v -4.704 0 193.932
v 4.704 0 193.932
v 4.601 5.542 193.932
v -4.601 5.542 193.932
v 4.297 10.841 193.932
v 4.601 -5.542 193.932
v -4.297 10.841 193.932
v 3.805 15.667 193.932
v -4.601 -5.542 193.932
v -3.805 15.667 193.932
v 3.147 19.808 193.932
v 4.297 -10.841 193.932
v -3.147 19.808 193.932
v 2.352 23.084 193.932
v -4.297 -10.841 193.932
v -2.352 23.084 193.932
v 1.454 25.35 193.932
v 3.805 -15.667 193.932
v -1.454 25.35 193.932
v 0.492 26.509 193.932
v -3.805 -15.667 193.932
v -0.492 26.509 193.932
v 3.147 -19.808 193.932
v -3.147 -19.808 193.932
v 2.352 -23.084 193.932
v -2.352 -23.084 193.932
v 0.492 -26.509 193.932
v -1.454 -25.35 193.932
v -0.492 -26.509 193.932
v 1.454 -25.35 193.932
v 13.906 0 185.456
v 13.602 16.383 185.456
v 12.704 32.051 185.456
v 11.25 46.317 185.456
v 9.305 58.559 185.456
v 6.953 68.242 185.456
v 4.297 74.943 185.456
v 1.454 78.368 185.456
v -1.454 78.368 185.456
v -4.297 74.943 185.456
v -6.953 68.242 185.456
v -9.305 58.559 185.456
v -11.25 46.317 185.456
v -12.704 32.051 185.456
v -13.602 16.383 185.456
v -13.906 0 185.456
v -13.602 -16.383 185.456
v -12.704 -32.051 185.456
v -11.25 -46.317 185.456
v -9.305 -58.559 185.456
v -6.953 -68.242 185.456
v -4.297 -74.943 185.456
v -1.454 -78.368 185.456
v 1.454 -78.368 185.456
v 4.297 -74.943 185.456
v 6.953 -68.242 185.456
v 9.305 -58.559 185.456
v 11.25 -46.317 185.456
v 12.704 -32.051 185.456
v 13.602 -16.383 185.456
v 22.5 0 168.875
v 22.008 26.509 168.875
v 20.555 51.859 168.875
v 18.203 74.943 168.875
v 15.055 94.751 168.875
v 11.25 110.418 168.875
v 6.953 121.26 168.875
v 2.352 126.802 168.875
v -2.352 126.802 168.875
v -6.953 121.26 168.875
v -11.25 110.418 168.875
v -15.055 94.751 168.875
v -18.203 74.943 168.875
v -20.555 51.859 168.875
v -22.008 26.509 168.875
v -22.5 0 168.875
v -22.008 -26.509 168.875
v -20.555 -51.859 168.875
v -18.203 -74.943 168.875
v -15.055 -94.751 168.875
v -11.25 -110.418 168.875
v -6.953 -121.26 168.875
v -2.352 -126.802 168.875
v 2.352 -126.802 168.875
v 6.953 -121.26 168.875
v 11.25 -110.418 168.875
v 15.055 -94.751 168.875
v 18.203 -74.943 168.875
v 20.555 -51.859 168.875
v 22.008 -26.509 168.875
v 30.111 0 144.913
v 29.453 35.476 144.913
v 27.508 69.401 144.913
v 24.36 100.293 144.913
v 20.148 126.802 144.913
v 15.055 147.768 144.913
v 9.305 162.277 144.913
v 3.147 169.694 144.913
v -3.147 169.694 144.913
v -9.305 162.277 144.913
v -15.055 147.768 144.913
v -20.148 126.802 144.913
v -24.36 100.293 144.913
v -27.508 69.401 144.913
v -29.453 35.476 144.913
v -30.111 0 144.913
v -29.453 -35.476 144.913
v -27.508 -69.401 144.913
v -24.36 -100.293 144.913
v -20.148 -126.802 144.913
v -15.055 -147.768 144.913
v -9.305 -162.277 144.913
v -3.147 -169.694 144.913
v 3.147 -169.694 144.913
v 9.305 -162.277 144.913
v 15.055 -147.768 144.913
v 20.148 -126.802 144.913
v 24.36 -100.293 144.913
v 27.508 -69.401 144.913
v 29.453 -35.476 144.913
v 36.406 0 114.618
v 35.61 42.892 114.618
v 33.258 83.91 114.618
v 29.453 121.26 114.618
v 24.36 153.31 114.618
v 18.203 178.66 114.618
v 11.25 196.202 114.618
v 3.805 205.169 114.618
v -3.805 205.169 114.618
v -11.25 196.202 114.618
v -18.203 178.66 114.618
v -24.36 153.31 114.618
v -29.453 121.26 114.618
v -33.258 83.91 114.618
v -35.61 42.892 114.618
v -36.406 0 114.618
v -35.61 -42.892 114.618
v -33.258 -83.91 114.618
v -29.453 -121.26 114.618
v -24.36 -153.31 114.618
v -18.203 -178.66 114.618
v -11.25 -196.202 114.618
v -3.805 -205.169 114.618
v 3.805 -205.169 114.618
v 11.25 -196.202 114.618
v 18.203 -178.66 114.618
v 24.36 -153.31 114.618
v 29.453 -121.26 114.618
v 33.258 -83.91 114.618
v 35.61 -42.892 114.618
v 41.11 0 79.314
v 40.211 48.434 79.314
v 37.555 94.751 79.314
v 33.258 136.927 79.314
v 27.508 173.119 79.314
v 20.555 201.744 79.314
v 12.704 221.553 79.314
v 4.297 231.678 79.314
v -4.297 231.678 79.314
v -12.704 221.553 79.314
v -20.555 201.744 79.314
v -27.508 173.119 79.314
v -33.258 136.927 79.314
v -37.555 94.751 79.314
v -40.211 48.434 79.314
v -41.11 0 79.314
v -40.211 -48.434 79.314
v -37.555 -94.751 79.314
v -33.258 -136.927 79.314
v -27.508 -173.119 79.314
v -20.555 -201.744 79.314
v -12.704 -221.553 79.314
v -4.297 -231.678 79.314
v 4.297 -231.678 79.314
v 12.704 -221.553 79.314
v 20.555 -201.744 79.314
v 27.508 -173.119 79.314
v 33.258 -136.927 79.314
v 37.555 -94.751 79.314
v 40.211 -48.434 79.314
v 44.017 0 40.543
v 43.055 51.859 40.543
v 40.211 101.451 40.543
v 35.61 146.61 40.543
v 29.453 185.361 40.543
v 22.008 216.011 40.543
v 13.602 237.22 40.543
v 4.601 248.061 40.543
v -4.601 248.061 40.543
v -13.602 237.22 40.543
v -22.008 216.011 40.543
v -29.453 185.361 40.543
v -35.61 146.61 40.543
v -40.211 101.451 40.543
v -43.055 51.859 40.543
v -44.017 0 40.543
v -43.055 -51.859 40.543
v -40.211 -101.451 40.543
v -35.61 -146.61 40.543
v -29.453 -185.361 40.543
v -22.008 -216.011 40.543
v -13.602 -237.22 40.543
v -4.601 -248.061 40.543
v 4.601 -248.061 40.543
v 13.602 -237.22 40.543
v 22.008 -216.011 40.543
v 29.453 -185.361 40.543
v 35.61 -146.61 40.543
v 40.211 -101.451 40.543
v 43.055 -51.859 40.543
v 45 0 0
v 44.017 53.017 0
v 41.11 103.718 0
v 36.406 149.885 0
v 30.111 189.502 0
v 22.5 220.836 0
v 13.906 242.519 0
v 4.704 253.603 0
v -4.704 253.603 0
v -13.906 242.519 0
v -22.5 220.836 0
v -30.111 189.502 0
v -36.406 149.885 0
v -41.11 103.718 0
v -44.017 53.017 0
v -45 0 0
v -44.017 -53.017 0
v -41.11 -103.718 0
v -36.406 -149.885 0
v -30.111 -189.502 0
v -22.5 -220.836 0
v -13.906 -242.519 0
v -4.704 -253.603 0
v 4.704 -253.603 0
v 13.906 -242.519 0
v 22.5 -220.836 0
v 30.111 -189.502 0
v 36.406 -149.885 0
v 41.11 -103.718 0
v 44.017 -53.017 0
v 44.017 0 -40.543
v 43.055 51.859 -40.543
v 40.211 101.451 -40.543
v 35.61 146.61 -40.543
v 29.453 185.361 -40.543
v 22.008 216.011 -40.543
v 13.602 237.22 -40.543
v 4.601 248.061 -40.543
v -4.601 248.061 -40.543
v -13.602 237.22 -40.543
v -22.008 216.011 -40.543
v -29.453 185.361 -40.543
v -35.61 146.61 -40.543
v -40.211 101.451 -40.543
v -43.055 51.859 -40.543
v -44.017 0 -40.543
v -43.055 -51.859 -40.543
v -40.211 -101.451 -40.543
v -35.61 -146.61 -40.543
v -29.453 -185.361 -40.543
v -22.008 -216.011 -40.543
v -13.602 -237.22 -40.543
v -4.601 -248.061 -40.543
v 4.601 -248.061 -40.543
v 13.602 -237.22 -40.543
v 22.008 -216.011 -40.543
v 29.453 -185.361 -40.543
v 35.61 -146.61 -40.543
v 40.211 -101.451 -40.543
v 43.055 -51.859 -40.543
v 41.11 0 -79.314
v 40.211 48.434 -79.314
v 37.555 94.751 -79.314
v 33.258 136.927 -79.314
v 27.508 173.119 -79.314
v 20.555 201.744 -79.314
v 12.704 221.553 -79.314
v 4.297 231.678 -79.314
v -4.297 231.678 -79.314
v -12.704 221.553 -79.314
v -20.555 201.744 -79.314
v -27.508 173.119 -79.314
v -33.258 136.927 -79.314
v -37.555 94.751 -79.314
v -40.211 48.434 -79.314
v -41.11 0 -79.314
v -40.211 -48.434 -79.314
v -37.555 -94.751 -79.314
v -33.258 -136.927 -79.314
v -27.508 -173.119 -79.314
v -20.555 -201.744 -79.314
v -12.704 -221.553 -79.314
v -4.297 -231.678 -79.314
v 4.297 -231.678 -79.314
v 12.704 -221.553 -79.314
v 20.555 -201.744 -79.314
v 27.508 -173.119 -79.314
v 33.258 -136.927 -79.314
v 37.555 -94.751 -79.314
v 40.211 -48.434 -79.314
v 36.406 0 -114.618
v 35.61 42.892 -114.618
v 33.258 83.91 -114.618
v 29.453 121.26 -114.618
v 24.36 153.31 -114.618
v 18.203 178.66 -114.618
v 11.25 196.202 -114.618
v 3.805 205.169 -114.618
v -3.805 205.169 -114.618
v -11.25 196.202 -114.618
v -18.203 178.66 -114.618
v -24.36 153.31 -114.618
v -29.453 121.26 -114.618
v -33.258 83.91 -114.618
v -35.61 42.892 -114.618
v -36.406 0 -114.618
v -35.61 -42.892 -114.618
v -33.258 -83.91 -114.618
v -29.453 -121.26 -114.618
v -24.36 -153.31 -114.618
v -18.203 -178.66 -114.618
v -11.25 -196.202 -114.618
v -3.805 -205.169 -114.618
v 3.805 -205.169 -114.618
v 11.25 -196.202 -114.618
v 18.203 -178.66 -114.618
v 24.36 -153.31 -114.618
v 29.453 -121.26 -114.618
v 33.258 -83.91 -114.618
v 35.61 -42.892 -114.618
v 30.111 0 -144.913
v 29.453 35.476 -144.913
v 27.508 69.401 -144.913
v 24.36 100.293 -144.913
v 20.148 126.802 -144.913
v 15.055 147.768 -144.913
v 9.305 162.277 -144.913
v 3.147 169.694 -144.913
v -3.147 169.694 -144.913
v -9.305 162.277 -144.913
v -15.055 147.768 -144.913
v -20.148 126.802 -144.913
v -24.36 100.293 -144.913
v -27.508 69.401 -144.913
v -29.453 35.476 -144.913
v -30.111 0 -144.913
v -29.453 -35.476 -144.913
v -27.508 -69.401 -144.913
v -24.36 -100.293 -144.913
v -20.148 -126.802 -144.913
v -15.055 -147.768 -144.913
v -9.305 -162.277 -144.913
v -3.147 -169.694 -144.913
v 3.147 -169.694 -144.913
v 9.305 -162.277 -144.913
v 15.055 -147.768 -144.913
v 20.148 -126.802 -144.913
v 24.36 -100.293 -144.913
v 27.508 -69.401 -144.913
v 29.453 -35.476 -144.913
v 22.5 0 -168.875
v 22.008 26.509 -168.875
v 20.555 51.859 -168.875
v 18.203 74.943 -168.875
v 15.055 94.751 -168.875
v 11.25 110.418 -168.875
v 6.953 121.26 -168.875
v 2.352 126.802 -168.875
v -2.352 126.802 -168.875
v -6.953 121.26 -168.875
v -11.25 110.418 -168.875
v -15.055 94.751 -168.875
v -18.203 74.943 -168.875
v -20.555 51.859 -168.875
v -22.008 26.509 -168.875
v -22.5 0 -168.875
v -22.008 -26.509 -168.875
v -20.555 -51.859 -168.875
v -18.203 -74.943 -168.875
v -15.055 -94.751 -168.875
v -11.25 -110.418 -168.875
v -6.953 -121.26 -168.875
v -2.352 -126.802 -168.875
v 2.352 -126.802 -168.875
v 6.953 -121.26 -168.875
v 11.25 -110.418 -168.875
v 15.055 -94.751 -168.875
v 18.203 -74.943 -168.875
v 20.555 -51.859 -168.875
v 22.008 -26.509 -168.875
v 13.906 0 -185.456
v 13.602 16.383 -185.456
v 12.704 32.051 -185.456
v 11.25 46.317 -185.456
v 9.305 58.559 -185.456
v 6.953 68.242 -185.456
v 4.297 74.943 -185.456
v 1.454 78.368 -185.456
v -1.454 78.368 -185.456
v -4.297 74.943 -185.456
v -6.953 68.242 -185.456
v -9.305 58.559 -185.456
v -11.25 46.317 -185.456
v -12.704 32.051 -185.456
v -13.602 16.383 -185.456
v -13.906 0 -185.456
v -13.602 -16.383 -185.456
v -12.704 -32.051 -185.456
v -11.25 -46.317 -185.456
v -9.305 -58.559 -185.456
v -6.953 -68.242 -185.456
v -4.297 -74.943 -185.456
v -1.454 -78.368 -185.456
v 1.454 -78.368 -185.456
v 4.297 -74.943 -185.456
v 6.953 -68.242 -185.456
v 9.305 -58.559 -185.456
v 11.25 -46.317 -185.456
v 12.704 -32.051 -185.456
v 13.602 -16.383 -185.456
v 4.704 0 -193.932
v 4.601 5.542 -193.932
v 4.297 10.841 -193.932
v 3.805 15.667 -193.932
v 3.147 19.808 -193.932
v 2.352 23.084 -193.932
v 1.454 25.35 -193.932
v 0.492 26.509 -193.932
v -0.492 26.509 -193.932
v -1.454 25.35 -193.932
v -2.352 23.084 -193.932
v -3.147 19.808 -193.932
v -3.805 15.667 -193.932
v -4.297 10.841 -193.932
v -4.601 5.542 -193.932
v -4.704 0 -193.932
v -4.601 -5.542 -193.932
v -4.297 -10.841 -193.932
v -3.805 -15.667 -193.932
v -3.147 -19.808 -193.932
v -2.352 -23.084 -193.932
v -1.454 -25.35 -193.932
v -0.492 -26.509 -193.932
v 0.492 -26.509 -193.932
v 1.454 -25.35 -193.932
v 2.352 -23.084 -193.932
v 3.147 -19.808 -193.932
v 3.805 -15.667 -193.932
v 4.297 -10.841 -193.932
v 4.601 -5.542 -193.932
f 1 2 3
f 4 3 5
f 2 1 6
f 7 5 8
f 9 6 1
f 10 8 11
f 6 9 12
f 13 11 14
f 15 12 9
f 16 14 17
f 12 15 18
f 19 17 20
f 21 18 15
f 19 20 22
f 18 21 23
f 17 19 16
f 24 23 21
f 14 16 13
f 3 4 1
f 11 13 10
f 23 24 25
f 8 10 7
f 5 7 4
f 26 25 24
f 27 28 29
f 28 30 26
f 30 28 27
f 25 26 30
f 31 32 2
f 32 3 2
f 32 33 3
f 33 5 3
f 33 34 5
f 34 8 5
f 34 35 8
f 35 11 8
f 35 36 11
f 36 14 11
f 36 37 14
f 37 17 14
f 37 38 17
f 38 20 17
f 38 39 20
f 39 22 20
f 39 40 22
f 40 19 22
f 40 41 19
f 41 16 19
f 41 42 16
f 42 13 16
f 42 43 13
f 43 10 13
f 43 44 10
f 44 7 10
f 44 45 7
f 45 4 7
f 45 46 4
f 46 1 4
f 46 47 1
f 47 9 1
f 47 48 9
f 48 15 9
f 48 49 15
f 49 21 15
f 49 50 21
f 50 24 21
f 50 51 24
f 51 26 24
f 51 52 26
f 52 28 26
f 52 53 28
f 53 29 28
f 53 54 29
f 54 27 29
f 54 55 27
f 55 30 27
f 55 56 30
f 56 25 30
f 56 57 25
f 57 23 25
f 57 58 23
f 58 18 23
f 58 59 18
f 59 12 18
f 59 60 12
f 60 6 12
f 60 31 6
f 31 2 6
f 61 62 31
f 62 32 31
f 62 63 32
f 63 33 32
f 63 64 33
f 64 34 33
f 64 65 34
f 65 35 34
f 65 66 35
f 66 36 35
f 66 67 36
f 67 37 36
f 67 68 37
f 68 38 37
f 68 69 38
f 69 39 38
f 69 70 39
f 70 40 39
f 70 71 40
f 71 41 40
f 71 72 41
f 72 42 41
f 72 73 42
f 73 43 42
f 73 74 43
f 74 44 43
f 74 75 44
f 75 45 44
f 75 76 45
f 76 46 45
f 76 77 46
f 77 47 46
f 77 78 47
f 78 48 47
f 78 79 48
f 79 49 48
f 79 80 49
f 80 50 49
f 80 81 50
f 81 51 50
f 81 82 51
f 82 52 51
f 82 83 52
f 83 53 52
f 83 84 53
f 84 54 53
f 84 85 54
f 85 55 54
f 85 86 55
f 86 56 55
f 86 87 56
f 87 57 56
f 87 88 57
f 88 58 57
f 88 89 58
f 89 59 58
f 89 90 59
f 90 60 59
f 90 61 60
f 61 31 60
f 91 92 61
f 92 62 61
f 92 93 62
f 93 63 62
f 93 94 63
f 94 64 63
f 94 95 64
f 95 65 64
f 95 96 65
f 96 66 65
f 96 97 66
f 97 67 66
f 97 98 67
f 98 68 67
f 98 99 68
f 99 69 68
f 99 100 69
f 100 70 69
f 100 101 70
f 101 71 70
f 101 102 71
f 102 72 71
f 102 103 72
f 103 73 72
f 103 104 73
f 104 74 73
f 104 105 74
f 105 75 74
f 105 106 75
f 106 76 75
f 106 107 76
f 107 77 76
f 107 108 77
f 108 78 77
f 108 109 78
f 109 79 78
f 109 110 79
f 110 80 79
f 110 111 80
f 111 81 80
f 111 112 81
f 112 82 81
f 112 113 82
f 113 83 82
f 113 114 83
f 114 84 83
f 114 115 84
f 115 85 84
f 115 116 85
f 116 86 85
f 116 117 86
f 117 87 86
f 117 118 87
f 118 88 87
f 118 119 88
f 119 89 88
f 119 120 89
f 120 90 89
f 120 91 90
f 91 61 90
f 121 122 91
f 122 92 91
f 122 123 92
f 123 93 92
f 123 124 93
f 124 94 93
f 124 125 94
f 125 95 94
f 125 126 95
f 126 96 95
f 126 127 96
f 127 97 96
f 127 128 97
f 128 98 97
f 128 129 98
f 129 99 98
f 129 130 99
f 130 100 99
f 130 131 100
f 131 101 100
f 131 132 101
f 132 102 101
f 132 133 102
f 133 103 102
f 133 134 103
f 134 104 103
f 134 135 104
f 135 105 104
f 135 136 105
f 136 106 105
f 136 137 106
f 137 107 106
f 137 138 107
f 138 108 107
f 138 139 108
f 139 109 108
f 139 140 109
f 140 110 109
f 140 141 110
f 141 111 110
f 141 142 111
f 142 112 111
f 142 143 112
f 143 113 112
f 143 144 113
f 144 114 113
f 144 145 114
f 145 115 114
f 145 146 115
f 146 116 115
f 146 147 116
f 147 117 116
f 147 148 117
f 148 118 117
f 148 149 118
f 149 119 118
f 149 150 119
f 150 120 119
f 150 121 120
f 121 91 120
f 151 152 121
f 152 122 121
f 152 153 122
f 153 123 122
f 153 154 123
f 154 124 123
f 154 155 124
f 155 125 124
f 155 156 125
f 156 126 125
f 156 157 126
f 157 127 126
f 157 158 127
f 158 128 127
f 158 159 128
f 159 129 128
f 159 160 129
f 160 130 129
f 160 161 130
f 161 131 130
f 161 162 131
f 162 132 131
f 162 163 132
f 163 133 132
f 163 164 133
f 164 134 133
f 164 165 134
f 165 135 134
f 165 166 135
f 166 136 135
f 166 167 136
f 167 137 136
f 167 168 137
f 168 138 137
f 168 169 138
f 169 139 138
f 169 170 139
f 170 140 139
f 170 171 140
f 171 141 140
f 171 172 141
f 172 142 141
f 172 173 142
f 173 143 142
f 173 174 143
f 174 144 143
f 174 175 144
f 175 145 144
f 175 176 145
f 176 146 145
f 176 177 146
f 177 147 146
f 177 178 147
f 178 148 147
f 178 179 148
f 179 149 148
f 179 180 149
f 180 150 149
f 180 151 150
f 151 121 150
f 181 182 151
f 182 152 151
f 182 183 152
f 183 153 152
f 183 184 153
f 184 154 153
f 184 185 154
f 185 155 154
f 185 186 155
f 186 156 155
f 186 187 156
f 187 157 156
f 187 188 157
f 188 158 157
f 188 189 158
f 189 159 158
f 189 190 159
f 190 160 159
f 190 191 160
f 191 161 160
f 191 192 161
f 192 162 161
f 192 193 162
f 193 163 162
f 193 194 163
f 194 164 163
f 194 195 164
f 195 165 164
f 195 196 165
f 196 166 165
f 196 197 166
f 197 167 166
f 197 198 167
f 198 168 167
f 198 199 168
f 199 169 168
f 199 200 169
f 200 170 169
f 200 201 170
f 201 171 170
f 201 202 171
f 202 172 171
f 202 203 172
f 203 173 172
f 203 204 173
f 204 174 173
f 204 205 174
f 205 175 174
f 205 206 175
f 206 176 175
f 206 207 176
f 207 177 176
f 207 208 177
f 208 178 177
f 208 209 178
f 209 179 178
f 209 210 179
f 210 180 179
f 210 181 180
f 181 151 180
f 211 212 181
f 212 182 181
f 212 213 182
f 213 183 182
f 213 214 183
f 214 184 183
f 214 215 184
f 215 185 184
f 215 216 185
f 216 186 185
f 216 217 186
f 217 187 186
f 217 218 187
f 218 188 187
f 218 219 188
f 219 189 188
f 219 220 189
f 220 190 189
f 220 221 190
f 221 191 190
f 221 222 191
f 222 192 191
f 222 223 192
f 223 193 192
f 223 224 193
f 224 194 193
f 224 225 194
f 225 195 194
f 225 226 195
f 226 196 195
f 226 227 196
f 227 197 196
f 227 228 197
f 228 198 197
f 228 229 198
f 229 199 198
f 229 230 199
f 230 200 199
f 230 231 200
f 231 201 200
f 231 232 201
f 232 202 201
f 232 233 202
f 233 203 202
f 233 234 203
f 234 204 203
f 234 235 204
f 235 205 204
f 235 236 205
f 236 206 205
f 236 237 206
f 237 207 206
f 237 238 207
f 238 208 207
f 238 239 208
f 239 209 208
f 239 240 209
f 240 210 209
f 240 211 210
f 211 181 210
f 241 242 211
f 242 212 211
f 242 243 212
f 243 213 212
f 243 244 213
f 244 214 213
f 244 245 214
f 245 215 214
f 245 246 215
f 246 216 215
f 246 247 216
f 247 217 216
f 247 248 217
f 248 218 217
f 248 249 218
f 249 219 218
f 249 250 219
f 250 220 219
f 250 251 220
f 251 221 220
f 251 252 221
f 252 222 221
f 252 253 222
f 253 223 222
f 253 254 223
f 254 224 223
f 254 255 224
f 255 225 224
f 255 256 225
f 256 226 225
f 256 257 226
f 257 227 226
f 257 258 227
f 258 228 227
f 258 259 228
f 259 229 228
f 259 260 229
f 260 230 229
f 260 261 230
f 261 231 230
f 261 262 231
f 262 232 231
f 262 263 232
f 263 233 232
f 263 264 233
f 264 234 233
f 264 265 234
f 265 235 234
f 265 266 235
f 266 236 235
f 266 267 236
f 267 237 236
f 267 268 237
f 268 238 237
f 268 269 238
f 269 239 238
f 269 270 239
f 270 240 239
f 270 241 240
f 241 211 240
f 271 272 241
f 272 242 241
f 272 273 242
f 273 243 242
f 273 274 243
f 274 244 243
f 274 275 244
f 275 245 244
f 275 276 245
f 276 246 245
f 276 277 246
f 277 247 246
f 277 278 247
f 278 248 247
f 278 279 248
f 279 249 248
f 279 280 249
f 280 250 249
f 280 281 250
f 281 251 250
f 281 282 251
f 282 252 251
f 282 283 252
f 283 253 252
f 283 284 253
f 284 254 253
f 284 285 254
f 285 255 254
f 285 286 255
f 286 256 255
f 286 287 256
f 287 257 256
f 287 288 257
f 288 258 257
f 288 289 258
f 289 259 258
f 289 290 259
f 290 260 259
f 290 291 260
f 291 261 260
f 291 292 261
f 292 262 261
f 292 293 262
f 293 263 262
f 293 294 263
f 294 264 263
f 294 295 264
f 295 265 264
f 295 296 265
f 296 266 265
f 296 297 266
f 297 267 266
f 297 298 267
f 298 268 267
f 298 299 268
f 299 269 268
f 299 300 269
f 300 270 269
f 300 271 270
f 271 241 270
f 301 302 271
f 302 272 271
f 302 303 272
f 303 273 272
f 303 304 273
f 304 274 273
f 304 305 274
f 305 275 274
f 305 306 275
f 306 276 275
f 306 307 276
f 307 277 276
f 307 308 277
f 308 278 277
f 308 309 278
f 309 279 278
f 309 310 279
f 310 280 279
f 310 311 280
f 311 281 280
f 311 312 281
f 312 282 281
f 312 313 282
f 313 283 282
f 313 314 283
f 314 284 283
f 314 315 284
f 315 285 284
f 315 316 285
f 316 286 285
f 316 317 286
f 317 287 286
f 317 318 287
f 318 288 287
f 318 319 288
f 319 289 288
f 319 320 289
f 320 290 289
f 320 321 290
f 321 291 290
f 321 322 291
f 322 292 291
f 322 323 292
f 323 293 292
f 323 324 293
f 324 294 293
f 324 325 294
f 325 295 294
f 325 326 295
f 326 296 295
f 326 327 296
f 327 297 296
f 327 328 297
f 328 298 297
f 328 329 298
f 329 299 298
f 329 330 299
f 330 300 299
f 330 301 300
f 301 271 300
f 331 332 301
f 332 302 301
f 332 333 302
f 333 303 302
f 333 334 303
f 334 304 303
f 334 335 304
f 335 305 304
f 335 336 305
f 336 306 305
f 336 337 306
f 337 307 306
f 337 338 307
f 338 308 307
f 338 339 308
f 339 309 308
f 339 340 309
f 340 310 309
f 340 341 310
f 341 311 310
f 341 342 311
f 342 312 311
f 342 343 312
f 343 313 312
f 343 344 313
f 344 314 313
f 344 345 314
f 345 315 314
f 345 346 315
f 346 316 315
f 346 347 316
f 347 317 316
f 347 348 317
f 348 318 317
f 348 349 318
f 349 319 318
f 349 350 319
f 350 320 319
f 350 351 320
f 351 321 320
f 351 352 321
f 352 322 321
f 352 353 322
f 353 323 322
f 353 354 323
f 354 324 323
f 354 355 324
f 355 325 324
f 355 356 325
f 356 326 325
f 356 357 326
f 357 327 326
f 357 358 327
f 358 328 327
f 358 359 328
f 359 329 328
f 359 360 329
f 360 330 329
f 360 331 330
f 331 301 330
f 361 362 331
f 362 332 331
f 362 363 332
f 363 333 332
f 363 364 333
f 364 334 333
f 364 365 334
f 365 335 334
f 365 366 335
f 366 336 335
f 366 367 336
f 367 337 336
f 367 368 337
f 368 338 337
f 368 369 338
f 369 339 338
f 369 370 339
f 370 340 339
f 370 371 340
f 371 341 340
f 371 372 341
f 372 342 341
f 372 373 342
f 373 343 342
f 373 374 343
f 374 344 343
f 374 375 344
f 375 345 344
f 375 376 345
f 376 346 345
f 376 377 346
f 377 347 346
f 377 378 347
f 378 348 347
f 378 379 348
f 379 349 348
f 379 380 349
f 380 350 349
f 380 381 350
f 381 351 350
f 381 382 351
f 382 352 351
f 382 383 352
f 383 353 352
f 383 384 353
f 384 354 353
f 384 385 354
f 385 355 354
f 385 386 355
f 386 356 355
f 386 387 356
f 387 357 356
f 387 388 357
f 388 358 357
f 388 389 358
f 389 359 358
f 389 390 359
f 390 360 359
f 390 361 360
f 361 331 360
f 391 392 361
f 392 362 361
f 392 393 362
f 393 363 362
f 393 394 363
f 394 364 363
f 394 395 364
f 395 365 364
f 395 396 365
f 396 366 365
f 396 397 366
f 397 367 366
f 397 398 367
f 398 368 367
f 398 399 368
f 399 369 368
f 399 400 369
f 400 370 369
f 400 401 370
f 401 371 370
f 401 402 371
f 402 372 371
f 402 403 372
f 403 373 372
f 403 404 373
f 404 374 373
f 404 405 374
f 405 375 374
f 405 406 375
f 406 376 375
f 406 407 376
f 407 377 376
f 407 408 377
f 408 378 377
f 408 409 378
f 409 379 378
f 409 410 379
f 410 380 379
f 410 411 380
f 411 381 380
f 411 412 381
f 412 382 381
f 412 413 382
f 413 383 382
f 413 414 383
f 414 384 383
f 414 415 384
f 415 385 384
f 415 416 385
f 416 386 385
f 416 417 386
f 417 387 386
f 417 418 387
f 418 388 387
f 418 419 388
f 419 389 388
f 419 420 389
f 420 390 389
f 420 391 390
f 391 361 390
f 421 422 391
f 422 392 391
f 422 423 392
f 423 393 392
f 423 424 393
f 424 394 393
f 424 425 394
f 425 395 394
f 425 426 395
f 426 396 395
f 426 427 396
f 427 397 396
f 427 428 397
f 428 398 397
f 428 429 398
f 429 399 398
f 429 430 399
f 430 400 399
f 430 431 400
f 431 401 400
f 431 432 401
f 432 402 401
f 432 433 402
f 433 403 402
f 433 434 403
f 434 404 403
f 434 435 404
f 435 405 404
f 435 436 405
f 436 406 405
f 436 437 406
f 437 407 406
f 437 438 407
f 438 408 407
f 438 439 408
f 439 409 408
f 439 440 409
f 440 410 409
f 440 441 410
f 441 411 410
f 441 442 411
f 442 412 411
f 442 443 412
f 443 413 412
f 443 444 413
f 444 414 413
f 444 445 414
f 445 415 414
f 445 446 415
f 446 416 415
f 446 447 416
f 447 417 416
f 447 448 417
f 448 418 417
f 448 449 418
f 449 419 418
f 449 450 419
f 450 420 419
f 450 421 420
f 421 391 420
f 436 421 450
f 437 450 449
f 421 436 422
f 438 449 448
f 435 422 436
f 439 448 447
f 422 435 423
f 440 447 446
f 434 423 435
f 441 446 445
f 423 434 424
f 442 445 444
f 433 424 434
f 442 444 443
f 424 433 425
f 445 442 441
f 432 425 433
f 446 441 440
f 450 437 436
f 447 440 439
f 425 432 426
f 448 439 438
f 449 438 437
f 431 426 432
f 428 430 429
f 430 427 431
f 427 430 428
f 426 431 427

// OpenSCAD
// Generated by SolidPython 1.0.1 on 2020-07-29 00:46:46


scale(v = [3, 17, 13]) {
	sphere(r = 15);
}
/***********************************************
*********      SolidPython code:      **********
************************************************
 
# import packages: SolidPython
from solid import *
from solid.utils import *
from itertools import chain, combinations, permutations


class Resize:

    def __init__(self, scad_file):
        self.scad_file = scad_file
        #self.scad_file = import_scad(scad_file)
        # cone/cylinder param:
        self.r1 = 0
        self.r2 = 0
        self.h = 0
        # rectangular prism param:
        self.w = 0
        self.l = 0
        # ellipse param:
        self.r = 0

    # import OpenScad code (file name corresponds to shape)


    # classify shape + parameters
    def assign(self, param1, param2, param3):
        if self.scad_file == 'cone.scad':
            self.r1 = param1
            self.r2 = param2
            self.h = param3
        elif self.scad_file == 'cylinder.scad':
            self.r1 = param1
            self.r2 = param2
            self.h = param3
        elif self.scad_file == 'rectangularPrism.scad':
            self.h = param1
            self.l = param2
            self.w = param3
        else:
            self.r = param1
            self.h = param2

    # resize parameters
    def iterate(self):
        x = range(3, 20, 2)
        i = 1
        if self.scad_file == 'cone.scad':
            tempList = list(permutations(x, 2))
            for temp in tempList:
                param1 = temp[0]
                param2 = temp[1]
                filepath = 'produced_scad_files/' + 'cone' + str(param1) + '_' + str(param2) + '_' + '.scad'
                scad_render_to_file(cylinder(h=param1, r1=param2, r2=0), filepath)

        elif self.scad_file == 'cylinder.scad':
            tempList = list(permutations(x, 3))
            for temp in tempList:
                param1 = temp[0]
                param2 = temp[1]
                filepath = 'produced_scad_files/' + 'cylinder' + str(param1) + '_' + str(param2) + '_' + '.scad'
                scad_render_to_file(cylinder(h=param1, r1=param2, r2=param2), filepath)

        elif self.scad_file == 'rectangularPrism.scad':
            tempList = list(permutations(x, 3))
            for temp in tempList:
                param1 = temp[0]
                param2 = temp[1]
                param3 = temp[2]
                filepath = 'produced_scad_files/' + 'rectangularPrism' + str(param1) + '_' + str(param2) + '_' + str(
                    param3) + '.scad'
                scad_render_to_file(cube(size=(param1, param2, param3)), filepath)

        elif self.scad_file == 'ellipse.scad':
            tempList = list(permutations(x, 4))
            for temp in tempList:
                param1 = temp[0]
                param2 = temp[1]
                param3 = temp[2]
                param4 = temp[3]
                filepath = 'produced_scad_files/' + 'ellipse' + str(param1) + '_' + str(param2) + '_' + str(param3) + '_' + str(param4) + '.scad'
                scad_render_to_file(scale([param1, param2, param3])(sphere(r=param4)), filepath)

    def render_to_scadfile(self):
        scad_render_to_file(scad, 'example.scad') 
 
************************************************/
